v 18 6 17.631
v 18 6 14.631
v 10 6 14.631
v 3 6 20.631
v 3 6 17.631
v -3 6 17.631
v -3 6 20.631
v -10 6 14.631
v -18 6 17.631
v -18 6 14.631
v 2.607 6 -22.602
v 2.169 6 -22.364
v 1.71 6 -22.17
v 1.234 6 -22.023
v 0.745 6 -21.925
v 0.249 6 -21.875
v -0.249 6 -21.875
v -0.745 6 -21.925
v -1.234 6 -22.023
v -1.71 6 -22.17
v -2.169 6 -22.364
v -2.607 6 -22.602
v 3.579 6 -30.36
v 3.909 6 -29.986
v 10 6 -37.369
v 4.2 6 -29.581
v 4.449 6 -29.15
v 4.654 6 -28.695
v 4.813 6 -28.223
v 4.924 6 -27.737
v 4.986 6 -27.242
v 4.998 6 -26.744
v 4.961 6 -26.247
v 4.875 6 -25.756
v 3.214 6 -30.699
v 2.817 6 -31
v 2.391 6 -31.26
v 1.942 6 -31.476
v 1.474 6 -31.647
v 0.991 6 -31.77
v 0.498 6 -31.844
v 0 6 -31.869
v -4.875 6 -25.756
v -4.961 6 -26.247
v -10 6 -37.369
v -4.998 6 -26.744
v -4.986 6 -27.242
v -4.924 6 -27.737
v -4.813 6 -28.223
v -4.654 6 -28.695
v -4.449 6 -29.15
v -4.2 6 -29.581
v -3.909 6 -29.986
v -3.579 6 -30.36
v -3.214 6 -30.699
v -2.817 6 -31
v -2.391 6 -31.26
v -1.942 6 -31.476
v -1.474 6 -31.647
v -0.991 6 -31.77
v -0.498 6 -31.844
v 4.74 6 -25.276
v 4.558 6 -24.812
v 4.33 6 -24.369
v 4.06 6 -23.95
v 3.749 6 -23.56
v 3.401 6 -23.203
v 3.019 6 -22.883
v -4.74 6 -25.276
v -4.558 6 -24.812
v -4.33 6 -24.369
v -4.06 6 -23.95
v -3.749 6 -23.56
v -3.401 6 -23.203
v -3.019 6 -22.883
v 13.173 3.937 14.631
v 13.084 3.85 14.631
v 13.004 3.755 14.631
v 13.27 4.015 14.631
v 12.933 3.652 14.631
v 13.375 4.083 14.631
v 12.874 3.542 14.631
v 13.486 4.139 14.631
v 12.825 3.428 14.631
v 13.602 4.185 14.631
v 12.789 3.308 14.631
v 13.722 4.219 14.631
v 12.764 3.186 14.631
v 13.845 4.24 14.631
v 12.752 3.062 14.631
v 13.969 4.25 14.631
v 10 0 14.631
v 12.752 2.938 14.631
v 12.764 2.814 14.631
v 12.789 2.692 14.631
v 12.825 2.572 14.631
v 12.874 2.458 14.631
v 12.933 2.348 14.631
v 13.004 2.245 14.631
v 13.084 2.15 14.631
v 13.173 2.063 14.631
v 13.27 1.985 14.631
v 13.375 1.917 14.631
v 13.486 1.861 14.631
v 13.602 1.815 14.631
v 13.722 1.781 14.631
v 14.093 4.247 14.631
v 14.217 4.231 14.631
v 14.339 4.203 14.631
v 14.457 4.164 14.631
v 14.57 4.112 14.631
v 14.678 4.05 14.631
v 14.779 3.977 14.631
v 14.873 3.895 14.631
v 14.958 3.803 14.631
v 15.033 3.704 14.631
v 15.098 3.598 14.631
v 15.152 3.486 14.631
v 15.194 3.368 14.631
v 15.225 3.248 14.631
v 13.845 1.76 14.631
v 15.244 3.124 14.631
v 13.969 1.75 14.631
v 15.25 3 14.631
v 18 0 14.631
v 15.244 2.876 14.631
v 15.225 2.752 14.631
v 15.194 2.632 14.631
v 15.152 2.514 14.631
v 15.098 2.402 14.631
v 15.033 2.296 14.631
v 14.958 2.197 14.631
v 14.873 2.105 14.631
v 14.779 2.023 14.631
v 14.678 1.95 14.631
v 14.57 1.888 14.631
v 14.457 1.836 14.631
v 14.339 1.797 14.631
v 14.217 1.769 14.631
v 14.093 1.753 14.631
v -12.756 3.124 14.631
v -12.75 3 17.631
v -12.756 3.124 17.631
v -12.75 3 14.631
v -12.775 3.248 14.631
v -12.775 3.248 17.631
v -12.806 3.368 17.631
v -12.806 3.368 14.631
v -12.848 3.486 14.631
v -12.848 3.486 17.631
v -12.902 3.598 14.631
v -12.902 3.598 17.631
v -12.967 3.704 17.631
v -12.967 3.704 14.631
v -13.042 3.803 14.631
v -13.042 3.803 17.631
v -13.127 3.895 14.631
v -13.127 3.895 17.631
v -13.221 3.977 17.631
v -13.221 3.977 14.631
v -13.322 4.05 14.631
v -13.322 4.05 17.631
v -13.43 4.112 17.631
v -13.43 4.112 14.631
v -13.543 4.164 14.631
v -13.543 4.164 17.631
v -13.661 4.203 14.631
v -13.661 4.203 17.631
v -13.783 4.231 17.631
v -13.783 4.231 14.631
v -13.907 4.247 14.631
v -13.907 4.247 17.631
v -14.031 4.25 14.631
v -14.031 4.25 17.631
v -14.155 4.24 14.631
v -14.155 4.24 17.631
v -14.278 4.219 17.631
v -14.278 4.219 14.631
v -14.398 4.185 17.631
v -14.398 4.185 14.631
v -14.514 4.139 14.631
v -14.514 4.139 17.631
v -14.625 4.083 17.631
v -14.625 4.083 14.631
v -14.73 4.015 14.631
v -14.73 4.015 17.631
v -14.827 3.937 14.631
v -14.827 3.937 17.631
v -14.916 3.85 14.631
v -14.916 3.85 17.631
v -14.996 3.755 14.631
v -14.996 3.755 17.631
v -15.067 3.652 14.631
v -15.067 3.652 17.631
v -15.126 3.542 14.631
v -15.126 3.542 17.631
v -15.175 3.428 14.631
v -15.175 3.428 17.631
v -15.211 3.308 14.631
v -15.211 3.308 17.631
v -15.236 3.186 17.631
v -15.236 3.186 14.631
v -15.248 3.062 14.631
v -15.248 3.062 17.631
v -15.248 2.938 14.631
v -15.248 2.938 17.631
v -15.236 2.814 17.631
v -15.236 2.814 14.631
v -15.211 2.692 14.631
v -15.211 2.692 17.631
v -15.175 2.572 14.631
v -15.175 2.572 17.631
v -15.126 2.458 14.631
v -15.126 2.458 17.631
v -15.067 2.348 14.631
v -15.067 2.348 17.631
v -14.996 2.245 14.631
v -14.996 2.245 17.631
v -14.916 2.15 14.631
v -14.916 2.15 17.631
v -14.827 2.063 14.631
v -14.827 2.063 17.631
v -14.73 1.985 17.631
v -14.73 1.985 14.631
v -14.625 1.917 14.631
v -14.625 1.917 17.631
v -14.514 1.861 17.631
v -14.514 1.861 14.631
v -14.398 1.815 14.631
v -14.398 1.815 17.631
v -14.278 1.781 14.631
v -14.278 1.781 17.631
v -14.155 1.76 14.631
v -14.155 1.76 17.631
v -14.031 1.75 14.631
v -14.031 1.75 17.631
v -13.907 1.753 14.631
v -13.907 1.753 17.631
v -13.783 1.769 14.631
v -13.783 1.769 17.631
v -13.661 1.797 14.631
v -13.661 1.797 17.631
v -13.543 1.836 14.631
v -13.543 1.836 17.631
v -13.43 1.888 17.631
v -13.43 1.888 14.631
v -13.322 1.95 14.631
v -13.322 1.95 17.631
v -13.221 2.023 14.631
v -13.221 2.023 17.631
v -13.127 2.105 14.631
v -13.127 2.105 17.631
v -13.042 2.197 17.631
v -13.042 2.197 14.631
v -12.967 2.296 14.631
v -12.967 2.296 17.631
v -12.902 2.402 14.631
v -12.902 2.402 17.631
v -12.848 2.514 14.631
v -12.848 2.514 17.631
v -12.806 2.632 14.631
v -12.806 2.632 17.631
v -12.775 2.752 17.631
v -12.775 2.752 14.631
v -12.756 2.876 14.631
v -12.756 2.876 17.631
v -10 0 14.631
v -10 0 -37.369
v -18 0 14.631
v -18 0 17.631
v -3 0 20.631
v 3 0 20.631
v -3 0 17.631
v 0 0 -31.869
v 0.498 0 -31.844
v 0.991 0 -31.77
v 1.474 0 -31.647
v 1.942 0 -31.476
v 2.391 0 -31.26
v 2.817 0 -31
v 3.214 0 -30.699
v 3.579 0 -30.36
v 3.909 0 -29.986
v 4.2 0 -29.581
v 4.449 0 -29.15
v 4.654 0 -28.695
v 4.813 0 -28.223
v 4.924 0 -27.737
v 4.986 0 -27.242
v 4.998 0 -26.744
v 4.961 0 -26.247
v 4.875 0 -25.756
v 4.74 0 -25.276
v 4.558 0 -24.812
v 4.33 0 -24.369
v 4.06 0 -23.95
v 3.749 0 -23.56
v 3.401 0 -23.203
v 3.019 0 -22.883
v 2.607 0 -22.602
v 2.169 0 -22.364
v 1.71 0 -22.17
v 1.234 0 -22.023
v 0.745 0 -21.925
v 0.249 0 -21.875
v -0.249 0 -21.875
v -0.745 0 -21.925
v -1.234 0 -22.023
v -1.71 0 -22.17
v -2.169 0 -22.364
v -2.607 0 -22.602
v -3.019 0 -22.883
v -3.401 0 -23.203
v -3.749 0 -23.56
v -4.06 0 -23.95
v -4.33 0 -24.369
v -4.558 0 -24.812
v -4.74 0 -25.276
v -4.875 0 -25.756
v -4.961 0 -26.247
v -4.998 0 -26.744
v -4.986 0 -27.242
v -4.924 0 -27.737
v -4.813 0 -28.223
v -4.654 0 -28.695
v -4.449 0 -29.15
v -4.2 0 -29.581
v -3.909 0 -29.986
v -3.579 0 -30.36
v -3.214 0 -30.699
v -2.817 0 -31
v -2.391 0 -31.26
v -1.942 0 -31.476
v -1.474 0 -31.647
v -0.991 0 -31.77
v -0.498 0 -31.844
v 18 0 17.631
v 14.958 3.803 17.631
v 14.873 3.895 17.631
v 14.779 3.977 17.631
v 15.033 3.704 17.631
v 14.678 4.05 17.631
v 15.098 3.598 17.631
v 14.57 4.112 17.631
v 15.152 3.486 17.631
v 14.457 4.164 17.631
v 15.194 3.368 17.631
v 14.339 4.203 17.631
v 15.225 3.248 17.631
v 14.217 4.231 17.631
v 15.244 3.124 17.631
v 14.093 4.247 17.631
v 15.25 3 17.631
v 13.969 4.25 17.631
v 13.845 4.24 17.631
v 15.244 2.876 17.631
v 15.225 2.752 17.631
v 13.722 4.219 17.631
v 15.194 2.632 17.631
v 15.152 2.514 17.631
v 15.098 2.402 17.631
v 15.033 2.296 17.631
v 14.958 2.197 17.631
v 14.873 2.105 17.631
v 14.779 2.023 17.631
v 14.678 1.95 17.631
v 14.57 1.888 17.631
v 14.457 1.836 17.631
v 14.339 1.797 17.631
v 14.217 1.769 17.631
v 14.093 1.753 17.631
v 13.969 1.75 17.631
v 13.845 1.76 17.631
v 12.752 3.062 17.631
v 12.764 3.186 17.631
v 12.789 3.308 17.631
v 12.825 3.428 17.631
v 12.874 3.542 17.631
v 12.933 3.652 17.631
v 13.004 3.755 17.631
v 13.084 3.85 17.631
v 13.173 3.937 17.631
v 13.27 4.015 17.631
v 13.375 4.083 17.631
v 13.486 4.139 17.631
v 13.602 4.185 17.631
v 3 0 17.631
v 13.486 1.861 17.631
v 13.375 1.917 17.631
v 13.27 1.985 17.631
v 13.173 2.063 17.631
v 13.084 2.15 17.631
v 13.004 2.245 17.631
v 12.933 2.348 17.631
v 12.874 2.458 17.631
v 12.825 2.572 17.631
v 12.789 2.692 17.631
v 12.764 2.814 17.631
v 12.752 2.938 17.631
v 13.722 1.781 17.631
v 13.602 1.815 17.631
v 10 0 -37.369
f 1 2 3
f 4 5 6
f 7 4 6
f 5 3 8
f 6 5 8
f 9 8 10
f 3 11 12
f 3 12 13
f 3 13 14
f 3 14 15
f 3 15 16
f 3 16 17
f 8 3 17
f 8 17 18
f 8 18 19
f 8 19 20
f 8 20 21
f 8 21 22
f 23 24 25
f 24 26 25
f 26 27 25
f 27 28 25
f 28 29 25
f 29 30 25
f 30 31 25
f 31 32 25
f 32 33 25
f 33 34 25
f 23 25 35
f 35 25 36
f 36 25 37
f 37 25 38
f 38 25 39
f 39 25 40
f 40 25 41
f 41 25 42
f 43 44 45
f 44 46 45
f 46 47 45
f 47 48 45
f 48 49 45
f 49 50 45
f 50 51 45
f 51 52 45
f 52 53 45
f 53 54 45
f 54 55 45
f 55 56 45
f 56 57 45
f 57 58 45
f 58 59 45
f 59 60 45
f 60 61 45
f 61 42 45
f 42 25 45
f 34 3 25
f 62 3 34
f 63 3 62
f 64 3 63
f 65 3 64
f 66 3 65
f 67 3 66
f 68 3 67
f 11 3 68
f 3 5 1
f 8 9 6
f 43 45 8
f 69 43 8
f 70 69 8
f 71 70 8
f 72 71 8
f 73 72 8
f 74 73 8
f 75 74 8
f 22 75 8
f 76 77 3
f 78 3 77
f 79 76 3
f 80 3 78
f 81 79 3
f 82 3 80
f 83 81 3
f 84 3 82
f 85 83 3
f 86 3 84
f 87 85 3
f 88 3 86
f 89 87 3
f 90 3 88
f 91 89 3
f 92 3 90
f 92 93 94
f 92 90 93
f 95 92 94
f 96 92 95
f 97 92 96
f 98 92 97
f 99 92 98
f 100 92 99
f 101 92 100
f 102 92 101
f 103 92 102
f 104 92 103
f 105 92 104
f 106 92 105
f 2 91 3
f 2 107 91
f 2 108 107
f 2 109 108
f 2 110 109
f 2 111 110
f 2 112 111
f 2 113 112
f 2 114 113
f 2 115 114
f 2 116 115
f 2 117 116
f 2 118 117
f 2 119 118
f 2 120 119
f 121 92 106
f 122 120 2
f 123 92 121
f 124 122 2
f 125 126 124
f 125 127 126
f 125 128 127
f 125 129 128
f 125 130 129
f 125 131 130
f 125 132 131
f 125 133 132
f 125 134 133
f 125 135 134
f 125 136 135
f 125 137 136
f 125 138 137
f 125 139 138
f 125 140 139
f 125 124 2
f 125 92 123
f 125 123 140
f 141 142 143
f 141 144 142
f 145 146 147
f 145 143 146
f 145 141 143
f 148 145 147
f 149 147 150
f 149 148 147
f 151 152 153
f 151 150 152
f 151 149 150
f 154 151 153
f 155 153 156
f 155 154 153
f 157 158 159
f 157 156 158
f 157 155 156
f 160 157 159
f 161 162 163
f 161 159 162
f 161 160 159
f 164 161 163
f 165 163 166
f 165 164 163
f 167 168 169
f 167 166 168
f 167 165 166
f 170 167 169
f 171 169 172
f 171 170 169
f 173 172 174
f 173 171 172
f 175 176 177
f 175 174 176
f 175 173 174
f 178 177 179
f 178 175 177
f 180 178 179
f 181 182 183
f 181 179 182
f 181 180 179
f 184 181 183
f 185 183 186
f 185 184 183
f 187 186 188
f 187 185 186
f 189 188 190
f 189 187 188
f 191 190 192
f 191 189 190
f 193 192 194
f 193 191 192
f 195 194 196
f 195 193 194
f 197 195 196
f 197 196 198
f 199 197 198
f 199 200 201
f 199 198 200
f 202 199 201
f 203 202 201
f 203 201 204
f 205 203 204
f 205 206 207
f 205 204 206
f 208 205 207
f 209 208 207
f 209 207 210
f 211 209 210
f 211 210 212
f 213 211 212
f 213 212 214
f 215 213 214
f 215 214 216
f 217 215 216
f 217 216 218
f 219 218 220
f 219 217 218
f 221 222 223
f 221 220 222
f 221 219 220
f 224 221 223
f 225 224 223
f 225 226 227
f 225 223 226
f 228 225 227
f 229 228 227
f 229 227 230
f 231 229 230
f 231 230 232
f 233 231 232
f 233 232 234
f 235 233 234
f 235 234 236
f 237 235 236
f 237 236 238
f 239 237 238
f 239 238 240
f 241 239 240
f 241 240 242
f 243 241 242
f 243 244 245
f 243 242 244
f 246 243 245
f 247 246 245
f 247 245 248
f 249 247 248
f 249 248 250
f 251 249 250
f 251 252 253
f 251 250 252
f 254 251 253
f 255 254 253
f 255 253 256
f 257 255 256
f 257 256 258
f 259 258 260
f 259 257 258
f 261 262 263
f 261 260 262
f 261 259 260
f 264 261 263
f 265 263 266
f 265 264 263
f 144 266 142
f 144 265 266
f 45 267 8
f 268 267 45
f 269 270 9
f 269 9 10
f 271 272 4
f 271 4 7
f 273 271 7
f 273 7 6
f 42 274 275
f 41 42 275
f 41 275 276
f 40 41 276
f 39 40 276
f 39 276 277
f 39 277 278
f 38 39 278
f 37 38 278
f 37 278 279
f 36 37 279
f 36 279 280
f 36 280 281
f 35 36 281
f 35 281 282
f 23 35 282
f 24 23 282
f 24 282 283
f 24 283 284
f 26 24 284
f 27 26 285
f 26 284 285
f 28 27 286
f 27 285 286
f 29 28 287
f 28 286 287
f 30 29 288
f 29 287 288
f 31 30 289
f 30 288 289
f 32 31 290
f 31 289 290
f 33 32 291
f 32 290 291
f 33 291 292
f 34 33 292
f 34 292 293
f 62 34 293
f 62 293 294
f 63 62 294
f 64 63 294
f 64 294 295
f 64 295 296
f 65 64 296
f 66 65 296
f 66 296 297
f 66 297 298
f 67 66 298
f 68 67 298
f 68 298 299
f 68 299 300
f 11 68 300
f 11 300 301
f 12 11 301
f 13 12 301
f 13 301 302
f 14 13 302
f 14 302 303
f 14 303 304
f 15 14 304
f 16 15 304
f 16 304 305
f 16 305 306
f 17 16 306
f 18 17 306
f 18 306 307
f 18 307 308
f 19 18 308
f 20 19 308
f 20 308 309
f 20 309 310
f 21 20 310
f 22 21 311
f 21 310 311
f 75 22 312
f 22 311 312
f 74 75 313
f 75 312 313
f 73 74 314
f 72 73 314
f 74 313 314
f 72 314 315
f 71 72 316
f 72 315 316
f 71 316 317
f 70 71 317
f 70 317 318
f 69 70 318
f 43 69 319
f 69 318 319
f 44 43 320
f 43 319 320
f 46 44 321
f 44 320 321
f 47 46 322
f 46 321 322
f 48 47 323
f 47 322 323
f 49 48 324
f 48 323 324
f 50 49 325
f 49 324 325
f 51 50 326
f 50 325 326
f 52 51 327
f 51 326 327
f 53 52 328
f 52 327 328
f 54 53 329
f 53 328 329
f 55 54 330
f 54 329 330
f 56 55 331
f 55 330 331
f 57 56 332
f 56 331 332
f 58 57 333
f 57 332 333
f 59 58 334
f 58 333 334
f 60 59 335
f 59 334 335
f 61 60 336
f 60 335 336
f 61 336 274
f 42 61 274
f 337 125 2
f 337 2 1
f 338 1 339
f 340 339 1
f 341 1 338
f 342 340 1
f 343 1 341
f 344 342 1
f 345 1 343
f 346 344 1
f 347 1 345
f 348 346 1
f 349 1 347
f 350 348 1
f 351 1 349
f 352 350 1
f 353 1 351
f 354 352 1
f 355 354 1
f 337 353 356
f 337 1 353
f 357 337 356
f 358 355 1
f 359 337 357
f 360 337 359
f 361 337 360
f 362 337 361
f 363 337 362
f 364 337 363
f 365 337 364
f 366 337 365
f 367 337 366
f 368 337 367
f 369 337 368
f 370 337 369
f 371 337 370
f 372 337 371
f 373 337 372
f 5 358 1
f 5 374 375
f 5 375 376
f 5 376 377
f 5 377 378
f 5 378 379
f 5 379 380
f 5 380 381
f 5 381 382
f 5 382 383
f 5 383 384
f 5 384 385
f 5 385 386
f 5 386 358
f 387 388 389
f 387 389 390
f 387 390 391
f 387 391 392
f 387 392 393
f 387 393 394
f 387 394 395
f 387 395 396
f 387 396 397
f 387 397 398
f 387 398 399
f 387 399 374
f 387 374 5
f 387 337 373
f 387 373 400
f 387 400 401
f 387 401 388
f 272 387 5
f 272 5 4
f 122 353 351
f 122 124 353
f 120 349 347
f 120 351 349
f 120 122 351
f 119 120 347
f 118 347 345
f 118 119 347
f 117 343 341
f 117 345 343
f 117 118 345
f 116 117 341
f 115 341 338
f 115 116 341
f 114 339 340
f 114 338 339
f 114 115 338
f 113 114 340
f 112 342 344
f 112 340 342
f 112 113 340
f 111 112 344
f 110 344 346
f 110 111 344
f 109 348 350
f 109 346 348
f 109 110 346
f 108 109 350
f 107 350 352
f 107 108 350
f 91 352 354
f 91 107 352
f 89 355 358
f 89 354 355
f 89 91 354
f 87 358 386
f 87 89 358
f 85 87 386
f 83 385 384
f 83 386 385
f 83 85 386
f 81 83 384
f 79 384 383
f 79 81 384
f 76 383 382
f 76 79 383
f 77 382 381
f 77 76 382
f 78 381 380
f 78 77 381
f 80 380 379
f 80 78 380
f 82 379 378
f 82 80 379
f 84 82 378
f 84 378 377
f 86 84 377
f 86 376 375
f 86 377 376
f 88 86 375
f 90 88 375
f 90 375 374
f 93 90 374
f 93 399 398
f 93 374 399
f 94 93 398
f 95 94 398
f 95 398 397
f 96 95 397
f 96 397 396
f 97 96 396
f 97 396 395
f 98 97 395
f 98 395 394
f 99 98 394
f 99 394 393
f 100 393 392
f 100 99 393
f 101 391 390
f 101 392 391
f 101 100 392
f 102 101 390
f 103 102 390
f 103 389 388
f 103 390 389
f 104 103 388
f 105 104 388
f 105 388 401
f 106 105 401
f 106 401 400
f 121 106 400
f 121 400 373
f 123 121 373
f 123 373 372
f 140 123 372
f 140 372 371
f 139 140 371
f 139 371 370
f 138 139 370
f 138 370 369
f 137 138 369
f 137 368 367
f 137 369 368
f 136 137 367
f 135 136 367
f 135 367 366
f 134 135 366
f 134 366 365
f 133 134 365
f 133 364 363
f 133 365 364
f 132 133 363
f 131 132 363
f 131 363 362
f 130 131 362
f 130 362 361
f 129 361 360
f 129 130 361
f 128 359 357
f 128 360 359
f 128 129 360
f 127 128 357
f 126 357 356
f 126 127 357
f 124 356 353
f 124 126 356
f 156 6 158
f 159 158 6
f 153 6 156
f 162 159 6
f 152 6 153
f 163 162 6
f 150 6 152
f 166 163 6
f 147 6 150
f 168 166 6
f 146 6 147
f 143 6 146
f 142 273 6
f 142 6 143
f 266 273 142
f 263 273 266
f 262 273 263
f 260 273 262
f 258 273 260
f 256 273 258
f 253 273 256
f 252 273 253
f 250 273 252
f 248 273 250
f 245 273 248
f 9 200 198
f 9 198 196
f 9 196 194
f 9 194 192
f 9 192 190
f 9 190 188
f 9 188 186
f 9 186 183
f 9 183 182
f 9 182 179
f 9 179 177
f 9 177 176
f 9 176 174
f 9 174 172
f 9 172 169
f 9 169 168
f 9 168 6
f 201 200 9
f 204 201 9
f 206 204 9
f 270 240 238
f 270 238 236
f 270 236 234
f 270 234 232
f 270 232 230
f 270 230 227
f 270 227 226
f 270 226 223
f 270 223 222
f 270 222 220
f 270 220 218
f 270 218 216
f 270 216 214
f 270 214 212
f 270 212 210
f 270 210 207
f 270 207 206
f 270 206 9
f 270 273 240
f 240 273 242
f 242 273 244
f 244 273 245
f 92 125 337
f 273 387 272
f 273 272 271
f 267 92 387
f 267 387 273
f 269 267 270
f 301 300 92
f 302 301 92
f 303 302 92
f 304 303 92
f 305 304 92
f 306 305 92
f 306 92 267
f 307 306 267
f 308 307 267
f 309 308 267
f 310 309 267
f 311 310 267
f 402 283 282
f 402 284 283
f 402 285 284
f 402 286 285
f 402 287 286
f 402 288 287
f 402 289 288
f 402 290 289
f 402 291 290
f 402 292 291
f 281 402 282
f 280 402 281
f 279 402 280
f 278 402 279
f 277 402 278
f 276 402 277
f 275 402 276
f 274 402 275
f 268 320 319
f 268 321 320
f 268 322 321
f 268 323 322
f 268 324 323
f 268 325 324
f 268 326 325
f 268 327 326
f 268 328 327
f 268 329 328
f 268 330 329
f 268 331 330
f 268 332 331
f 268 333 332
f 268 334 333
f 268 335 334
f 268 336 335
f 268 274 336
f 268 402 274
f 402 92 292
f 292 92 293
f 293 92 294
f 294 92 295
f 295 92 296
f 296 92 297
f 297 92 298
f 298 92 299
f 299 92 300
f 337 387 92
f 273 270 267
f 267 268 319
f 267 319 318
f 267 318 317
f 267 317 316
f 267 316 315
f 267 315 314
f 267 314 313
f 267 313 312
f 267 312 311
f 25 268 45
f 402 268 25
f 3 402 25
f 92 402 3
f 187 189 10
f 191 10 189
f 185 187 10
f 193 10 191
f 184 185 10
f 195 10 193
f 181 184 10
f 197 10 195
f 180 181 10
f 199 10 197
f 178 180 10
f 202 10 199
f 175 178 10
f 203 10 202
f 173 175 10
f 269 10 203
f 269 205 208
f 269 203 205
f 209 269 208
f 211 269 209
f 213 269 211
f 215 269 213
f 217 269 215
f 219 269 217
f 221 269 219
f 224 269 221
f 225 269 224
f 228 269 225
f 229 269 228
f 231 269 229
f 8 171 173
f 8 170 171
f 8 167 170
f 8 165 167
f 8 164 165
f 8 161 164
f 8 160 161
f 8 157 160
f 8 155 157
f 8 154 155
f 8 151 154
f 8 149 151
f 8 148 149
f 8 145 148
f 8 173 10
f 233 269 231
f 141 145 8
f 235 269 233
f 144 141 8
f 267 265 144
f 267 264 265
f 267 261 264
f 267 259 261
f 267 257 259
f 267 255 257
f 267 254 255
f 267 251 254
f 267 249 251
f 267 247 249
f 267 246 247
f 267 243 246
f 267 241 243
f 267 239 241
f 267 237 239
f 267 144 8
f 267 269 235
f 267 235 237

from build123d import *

# Parameters (mm, degrees)
EXTRUDE_1_DEPTH          = 6
SKETCH_3_R               = 5
CUT_EXTRUDE_1_DEPTH      = 42.909697148
CUT_EXTRUDE_3_DEPTH      = 42.909697148
CUT_EXTRUDE_3_DEPTH_BACK = 42.909697148
SKETCH_4_R               = 1.25


with BuildPart() as part:
    # 草图1 → 凸台-拉伸1 (new body)
    with BuildSketch(Plane(origin=(0, 0, 0), x_dir=(1, 0, 0), z_dir=(0, 1, 0))):
        Polygon((-10, 37.368739811), (10, 37.368739811), (10, -14.631260189), (18, -14.631260189), (18, -17.631260189), (3, -17.631260189), (3, -20.631260189), (-3, -20.631260189), (-3, -17.631260189), (-18, -17.631260189), (-18, -14.631260189), (-10, -14.631260189), align=None)
    extrude(amount=EXTRUDE_1_DEPTH)

    # 草图3 → 切除-拉伸1 (cut, through all)
    with BuildSketch(Plane.XZ):
        with Locations(Location((0, -26.868739811, 0), (0, 0, 270))):
            Circle(SKETCH_3_R)
    extrude(amount=-CUT_EXTRUDE_1_DEPTH, mode=Mode.SUBTRACT)

    # 草图4 → 切除-拉伸3 (cut, two sides: drawn at the far end of the back side and taken through both)
    with BuildSketch(Plane.XY.offset(-CUT_EXTRUDE_3_DEPTH_BACK)):
        with Locations((-14, 3)):
            Circle(SKETCH_4_R)
        with Locations((14, 3)):
            Circle(SKETCH_4_R)
    extrude(amount=CUT_EXTRUDE_3_DEPTH + CUT_EXTRUDE_3_DEPTH_BACK, mode=Mode.SUBTRACT)


solid = part.part
